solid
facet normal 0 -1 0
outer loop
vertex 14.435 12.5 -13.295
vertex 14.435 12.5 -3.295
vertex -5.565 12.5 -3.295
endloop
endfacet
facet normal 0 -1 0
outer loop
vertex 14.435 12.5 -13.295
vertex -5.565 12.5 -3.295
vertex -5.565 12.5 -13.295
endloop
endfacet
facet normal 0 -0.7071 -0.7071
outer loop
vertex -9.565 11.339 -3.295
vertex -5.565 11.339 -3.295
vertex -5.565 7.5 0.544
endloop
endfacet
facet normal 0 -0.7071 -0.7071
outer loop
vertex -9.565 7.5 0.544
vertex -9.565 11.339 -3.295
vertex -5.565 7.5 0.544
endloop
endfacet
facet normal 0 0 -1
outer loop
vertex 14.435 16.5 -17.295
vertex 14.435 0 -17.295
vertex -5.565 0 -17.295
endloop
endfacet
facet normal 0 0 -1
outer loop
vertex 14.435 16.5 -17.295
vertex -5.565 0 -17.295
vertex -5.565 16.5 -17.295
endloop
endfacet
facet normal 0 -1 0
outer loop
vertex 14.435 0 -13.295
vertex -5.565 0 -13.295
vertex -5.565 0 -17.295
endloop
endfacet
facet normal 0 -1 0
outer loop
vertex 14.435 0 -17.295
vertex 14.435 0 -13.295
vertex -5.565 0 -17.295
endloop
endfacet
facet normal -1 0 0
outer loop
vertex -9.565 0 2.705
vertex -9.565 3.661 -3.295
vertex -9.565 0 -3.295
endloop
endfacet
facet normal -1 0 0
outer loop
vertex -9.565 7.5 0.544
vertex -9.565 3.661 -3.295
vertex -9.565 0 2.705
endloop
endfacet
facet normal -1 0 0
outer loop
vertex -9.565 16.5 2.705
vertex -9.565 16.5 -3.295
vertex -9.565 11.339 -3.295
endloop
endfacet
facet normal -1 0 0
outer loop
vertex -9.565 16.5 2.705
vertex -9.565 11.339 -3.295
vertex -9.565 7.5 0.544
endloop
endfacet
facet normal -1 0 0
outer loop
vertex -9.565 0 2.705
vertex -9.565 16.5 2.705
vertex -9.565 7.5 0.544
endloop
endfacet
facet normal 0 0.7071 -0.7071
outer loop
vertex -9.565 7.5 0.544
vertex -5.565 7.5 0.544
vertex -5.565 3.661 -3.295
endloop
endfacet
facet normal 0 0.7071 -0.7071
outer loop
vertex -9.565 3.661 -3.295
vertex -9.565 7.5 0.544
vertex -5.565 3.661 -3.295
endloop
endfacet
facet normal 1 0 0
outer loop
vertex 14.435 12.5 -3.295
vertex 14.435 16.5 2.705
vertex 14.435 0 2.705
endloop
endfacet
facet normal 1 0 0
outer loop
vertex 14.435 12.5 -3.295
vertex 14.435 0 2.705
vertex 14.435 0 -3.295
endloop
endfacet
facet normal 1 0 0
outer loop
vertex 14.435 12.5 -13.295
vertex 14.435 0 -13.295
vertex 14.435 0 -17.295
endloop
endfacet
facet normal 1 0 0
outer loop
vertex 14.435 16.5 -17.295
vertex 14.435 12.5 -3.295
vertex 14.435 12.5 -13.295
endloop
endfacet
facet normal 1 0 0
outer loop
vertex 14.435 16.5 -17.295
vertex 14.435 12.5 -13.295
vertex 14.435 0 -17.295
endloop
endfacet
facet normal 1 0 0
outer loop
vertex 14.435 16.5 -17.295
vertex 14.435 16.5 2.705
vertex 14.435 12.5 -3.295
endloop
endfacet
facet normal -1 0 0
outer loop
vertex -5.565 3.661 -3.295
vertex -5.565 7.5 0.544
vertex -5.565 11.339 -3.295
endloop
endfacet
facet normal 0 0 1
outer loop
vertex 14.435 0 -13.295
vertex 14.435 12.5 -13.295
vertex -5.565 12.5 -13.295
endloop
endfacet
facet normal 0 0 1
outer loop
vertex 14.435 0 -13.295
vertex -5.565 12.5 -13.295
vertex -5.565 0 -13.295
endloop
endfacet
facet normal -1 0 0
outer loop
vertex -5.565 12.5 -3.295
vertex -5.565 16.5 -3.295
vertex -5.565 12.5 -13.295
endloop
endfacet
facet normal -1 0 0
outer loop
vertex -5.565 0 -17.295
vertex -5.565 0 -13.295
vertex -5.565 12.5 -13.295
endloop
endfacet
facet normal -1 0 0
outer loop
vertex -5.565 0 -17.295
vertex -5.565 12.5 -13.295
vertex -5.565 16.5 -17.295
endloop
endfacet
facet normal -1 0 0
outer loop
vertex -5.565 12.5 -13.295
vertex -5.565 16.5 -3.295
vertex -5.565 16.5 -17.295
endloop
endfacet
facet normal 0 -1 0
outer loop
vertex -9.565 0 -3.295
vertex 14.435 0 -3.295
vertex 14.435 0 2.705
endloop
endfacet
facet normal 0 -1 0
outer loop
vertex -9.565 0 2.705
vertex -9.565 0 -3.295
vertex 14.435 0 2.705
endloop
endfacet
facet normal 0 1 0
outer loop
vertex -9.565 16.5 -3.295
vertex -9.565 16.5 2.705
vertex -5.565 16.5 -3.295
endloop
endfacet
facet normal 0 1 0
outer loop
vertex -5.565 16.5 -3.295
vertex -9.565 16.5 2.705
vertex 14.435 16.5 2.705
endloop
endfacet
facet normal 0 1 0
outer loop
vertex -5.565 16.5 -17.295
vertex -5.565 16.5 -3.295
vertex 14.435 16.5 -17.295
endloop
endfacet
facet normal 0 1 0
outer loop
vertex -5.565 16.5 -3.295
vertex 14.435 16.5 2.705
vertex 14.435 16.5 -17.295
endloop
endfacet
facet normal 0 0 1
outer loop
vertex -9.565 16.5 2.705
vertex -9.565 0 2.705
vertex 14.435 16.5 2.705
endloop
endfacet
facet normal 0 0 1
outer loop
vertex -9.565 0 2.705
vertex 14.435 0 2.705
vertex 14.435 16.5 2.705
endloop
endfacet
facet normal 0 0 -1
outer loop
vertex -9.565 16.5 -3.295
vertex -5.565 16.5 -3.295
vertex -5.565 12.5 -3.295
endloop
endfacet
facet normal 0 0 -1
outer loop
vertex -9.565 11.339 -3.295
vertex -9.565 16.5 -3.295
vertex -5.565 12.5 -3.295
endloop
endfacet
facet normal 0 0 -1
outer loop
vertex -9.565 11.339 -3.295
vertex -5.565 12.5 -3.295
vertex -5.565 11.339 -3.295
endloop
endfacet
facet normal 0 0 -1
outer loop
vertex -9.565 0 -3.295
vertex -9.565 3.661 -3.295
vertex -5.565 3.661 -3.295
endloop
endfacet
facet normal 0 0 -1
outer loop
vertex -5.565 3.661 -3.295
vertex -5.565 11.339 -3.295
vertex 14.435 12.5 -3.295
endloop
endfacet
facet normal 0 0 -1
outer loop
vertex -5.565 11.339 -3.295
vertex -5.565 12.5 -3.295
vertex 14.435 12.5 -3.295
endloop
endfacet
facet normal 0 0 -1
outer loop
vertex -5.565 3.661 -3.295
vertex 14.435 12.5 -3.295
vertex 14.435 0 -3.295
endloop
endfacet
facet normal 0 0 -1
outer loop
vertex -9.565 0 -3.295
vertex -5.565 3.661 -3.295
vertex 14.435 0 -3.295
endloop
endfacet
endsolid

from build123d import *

# Parameters (mm, degrees)
BOSS_EXTRUDE1_DEPTH = 12.5
BOSS_EXTRUDE4_DEPTH = 20
BOSS_EXTRUDE5_DEPTH = 4


with BuildPart() as part:
    # Sketch1 → Boss-Extrude1 (new body)
    with BuildSketch(Plane(origin=(0, 0, 0), x_dir=(1, 0, 0), z_dir=(0, 1, 0))):
        Polygon((-2.564516129, 3.29516129), (14.435483871, 3.29516129), (14.435483871, -2.70483871), (-5.564516129, -2.70483871), (-5.564516129, 3.29516129), (-4.064516129, 3.29516129), align=None)
    extrude(amount=BOSS_EXTRUDE1_DEPTH)

    # Sketch2 → Boss-Extrude4 (add)
    with BuildSketch(Plane(origin=(14.435483871, 0, 0), x_dir=(0, 0, -1), z_dir=(1, 0, 0))):
        Polygon((-2.70483871, 12.5), (13.29516129, 12.5), (13.29516129, 0), (17.29516129, 0), (17.29516129, 12.5), (17.29516129, 16.5), (-2.70483871, 16.5), align=None)
    extrude(amount=-BOSS_EXTRUDE4_DEPTH)

    # Sketch5 → Boss-Extrude5 (add)
    with BuildSketch(Plane.ZY.offset(5.564516129)):
        Polygon((-3.29516129, 0), (2.70483871, 0), (2.70483871, 16.5), (-3.29516129, 16.5), (-3.29516129, 11.338834765), (0.543673475, 7.5), (-3.29516129, 3.661165235), align=None)
    extrude(amount=BOSS_EXTRUDE5_DEPTH)


solid = part.part
